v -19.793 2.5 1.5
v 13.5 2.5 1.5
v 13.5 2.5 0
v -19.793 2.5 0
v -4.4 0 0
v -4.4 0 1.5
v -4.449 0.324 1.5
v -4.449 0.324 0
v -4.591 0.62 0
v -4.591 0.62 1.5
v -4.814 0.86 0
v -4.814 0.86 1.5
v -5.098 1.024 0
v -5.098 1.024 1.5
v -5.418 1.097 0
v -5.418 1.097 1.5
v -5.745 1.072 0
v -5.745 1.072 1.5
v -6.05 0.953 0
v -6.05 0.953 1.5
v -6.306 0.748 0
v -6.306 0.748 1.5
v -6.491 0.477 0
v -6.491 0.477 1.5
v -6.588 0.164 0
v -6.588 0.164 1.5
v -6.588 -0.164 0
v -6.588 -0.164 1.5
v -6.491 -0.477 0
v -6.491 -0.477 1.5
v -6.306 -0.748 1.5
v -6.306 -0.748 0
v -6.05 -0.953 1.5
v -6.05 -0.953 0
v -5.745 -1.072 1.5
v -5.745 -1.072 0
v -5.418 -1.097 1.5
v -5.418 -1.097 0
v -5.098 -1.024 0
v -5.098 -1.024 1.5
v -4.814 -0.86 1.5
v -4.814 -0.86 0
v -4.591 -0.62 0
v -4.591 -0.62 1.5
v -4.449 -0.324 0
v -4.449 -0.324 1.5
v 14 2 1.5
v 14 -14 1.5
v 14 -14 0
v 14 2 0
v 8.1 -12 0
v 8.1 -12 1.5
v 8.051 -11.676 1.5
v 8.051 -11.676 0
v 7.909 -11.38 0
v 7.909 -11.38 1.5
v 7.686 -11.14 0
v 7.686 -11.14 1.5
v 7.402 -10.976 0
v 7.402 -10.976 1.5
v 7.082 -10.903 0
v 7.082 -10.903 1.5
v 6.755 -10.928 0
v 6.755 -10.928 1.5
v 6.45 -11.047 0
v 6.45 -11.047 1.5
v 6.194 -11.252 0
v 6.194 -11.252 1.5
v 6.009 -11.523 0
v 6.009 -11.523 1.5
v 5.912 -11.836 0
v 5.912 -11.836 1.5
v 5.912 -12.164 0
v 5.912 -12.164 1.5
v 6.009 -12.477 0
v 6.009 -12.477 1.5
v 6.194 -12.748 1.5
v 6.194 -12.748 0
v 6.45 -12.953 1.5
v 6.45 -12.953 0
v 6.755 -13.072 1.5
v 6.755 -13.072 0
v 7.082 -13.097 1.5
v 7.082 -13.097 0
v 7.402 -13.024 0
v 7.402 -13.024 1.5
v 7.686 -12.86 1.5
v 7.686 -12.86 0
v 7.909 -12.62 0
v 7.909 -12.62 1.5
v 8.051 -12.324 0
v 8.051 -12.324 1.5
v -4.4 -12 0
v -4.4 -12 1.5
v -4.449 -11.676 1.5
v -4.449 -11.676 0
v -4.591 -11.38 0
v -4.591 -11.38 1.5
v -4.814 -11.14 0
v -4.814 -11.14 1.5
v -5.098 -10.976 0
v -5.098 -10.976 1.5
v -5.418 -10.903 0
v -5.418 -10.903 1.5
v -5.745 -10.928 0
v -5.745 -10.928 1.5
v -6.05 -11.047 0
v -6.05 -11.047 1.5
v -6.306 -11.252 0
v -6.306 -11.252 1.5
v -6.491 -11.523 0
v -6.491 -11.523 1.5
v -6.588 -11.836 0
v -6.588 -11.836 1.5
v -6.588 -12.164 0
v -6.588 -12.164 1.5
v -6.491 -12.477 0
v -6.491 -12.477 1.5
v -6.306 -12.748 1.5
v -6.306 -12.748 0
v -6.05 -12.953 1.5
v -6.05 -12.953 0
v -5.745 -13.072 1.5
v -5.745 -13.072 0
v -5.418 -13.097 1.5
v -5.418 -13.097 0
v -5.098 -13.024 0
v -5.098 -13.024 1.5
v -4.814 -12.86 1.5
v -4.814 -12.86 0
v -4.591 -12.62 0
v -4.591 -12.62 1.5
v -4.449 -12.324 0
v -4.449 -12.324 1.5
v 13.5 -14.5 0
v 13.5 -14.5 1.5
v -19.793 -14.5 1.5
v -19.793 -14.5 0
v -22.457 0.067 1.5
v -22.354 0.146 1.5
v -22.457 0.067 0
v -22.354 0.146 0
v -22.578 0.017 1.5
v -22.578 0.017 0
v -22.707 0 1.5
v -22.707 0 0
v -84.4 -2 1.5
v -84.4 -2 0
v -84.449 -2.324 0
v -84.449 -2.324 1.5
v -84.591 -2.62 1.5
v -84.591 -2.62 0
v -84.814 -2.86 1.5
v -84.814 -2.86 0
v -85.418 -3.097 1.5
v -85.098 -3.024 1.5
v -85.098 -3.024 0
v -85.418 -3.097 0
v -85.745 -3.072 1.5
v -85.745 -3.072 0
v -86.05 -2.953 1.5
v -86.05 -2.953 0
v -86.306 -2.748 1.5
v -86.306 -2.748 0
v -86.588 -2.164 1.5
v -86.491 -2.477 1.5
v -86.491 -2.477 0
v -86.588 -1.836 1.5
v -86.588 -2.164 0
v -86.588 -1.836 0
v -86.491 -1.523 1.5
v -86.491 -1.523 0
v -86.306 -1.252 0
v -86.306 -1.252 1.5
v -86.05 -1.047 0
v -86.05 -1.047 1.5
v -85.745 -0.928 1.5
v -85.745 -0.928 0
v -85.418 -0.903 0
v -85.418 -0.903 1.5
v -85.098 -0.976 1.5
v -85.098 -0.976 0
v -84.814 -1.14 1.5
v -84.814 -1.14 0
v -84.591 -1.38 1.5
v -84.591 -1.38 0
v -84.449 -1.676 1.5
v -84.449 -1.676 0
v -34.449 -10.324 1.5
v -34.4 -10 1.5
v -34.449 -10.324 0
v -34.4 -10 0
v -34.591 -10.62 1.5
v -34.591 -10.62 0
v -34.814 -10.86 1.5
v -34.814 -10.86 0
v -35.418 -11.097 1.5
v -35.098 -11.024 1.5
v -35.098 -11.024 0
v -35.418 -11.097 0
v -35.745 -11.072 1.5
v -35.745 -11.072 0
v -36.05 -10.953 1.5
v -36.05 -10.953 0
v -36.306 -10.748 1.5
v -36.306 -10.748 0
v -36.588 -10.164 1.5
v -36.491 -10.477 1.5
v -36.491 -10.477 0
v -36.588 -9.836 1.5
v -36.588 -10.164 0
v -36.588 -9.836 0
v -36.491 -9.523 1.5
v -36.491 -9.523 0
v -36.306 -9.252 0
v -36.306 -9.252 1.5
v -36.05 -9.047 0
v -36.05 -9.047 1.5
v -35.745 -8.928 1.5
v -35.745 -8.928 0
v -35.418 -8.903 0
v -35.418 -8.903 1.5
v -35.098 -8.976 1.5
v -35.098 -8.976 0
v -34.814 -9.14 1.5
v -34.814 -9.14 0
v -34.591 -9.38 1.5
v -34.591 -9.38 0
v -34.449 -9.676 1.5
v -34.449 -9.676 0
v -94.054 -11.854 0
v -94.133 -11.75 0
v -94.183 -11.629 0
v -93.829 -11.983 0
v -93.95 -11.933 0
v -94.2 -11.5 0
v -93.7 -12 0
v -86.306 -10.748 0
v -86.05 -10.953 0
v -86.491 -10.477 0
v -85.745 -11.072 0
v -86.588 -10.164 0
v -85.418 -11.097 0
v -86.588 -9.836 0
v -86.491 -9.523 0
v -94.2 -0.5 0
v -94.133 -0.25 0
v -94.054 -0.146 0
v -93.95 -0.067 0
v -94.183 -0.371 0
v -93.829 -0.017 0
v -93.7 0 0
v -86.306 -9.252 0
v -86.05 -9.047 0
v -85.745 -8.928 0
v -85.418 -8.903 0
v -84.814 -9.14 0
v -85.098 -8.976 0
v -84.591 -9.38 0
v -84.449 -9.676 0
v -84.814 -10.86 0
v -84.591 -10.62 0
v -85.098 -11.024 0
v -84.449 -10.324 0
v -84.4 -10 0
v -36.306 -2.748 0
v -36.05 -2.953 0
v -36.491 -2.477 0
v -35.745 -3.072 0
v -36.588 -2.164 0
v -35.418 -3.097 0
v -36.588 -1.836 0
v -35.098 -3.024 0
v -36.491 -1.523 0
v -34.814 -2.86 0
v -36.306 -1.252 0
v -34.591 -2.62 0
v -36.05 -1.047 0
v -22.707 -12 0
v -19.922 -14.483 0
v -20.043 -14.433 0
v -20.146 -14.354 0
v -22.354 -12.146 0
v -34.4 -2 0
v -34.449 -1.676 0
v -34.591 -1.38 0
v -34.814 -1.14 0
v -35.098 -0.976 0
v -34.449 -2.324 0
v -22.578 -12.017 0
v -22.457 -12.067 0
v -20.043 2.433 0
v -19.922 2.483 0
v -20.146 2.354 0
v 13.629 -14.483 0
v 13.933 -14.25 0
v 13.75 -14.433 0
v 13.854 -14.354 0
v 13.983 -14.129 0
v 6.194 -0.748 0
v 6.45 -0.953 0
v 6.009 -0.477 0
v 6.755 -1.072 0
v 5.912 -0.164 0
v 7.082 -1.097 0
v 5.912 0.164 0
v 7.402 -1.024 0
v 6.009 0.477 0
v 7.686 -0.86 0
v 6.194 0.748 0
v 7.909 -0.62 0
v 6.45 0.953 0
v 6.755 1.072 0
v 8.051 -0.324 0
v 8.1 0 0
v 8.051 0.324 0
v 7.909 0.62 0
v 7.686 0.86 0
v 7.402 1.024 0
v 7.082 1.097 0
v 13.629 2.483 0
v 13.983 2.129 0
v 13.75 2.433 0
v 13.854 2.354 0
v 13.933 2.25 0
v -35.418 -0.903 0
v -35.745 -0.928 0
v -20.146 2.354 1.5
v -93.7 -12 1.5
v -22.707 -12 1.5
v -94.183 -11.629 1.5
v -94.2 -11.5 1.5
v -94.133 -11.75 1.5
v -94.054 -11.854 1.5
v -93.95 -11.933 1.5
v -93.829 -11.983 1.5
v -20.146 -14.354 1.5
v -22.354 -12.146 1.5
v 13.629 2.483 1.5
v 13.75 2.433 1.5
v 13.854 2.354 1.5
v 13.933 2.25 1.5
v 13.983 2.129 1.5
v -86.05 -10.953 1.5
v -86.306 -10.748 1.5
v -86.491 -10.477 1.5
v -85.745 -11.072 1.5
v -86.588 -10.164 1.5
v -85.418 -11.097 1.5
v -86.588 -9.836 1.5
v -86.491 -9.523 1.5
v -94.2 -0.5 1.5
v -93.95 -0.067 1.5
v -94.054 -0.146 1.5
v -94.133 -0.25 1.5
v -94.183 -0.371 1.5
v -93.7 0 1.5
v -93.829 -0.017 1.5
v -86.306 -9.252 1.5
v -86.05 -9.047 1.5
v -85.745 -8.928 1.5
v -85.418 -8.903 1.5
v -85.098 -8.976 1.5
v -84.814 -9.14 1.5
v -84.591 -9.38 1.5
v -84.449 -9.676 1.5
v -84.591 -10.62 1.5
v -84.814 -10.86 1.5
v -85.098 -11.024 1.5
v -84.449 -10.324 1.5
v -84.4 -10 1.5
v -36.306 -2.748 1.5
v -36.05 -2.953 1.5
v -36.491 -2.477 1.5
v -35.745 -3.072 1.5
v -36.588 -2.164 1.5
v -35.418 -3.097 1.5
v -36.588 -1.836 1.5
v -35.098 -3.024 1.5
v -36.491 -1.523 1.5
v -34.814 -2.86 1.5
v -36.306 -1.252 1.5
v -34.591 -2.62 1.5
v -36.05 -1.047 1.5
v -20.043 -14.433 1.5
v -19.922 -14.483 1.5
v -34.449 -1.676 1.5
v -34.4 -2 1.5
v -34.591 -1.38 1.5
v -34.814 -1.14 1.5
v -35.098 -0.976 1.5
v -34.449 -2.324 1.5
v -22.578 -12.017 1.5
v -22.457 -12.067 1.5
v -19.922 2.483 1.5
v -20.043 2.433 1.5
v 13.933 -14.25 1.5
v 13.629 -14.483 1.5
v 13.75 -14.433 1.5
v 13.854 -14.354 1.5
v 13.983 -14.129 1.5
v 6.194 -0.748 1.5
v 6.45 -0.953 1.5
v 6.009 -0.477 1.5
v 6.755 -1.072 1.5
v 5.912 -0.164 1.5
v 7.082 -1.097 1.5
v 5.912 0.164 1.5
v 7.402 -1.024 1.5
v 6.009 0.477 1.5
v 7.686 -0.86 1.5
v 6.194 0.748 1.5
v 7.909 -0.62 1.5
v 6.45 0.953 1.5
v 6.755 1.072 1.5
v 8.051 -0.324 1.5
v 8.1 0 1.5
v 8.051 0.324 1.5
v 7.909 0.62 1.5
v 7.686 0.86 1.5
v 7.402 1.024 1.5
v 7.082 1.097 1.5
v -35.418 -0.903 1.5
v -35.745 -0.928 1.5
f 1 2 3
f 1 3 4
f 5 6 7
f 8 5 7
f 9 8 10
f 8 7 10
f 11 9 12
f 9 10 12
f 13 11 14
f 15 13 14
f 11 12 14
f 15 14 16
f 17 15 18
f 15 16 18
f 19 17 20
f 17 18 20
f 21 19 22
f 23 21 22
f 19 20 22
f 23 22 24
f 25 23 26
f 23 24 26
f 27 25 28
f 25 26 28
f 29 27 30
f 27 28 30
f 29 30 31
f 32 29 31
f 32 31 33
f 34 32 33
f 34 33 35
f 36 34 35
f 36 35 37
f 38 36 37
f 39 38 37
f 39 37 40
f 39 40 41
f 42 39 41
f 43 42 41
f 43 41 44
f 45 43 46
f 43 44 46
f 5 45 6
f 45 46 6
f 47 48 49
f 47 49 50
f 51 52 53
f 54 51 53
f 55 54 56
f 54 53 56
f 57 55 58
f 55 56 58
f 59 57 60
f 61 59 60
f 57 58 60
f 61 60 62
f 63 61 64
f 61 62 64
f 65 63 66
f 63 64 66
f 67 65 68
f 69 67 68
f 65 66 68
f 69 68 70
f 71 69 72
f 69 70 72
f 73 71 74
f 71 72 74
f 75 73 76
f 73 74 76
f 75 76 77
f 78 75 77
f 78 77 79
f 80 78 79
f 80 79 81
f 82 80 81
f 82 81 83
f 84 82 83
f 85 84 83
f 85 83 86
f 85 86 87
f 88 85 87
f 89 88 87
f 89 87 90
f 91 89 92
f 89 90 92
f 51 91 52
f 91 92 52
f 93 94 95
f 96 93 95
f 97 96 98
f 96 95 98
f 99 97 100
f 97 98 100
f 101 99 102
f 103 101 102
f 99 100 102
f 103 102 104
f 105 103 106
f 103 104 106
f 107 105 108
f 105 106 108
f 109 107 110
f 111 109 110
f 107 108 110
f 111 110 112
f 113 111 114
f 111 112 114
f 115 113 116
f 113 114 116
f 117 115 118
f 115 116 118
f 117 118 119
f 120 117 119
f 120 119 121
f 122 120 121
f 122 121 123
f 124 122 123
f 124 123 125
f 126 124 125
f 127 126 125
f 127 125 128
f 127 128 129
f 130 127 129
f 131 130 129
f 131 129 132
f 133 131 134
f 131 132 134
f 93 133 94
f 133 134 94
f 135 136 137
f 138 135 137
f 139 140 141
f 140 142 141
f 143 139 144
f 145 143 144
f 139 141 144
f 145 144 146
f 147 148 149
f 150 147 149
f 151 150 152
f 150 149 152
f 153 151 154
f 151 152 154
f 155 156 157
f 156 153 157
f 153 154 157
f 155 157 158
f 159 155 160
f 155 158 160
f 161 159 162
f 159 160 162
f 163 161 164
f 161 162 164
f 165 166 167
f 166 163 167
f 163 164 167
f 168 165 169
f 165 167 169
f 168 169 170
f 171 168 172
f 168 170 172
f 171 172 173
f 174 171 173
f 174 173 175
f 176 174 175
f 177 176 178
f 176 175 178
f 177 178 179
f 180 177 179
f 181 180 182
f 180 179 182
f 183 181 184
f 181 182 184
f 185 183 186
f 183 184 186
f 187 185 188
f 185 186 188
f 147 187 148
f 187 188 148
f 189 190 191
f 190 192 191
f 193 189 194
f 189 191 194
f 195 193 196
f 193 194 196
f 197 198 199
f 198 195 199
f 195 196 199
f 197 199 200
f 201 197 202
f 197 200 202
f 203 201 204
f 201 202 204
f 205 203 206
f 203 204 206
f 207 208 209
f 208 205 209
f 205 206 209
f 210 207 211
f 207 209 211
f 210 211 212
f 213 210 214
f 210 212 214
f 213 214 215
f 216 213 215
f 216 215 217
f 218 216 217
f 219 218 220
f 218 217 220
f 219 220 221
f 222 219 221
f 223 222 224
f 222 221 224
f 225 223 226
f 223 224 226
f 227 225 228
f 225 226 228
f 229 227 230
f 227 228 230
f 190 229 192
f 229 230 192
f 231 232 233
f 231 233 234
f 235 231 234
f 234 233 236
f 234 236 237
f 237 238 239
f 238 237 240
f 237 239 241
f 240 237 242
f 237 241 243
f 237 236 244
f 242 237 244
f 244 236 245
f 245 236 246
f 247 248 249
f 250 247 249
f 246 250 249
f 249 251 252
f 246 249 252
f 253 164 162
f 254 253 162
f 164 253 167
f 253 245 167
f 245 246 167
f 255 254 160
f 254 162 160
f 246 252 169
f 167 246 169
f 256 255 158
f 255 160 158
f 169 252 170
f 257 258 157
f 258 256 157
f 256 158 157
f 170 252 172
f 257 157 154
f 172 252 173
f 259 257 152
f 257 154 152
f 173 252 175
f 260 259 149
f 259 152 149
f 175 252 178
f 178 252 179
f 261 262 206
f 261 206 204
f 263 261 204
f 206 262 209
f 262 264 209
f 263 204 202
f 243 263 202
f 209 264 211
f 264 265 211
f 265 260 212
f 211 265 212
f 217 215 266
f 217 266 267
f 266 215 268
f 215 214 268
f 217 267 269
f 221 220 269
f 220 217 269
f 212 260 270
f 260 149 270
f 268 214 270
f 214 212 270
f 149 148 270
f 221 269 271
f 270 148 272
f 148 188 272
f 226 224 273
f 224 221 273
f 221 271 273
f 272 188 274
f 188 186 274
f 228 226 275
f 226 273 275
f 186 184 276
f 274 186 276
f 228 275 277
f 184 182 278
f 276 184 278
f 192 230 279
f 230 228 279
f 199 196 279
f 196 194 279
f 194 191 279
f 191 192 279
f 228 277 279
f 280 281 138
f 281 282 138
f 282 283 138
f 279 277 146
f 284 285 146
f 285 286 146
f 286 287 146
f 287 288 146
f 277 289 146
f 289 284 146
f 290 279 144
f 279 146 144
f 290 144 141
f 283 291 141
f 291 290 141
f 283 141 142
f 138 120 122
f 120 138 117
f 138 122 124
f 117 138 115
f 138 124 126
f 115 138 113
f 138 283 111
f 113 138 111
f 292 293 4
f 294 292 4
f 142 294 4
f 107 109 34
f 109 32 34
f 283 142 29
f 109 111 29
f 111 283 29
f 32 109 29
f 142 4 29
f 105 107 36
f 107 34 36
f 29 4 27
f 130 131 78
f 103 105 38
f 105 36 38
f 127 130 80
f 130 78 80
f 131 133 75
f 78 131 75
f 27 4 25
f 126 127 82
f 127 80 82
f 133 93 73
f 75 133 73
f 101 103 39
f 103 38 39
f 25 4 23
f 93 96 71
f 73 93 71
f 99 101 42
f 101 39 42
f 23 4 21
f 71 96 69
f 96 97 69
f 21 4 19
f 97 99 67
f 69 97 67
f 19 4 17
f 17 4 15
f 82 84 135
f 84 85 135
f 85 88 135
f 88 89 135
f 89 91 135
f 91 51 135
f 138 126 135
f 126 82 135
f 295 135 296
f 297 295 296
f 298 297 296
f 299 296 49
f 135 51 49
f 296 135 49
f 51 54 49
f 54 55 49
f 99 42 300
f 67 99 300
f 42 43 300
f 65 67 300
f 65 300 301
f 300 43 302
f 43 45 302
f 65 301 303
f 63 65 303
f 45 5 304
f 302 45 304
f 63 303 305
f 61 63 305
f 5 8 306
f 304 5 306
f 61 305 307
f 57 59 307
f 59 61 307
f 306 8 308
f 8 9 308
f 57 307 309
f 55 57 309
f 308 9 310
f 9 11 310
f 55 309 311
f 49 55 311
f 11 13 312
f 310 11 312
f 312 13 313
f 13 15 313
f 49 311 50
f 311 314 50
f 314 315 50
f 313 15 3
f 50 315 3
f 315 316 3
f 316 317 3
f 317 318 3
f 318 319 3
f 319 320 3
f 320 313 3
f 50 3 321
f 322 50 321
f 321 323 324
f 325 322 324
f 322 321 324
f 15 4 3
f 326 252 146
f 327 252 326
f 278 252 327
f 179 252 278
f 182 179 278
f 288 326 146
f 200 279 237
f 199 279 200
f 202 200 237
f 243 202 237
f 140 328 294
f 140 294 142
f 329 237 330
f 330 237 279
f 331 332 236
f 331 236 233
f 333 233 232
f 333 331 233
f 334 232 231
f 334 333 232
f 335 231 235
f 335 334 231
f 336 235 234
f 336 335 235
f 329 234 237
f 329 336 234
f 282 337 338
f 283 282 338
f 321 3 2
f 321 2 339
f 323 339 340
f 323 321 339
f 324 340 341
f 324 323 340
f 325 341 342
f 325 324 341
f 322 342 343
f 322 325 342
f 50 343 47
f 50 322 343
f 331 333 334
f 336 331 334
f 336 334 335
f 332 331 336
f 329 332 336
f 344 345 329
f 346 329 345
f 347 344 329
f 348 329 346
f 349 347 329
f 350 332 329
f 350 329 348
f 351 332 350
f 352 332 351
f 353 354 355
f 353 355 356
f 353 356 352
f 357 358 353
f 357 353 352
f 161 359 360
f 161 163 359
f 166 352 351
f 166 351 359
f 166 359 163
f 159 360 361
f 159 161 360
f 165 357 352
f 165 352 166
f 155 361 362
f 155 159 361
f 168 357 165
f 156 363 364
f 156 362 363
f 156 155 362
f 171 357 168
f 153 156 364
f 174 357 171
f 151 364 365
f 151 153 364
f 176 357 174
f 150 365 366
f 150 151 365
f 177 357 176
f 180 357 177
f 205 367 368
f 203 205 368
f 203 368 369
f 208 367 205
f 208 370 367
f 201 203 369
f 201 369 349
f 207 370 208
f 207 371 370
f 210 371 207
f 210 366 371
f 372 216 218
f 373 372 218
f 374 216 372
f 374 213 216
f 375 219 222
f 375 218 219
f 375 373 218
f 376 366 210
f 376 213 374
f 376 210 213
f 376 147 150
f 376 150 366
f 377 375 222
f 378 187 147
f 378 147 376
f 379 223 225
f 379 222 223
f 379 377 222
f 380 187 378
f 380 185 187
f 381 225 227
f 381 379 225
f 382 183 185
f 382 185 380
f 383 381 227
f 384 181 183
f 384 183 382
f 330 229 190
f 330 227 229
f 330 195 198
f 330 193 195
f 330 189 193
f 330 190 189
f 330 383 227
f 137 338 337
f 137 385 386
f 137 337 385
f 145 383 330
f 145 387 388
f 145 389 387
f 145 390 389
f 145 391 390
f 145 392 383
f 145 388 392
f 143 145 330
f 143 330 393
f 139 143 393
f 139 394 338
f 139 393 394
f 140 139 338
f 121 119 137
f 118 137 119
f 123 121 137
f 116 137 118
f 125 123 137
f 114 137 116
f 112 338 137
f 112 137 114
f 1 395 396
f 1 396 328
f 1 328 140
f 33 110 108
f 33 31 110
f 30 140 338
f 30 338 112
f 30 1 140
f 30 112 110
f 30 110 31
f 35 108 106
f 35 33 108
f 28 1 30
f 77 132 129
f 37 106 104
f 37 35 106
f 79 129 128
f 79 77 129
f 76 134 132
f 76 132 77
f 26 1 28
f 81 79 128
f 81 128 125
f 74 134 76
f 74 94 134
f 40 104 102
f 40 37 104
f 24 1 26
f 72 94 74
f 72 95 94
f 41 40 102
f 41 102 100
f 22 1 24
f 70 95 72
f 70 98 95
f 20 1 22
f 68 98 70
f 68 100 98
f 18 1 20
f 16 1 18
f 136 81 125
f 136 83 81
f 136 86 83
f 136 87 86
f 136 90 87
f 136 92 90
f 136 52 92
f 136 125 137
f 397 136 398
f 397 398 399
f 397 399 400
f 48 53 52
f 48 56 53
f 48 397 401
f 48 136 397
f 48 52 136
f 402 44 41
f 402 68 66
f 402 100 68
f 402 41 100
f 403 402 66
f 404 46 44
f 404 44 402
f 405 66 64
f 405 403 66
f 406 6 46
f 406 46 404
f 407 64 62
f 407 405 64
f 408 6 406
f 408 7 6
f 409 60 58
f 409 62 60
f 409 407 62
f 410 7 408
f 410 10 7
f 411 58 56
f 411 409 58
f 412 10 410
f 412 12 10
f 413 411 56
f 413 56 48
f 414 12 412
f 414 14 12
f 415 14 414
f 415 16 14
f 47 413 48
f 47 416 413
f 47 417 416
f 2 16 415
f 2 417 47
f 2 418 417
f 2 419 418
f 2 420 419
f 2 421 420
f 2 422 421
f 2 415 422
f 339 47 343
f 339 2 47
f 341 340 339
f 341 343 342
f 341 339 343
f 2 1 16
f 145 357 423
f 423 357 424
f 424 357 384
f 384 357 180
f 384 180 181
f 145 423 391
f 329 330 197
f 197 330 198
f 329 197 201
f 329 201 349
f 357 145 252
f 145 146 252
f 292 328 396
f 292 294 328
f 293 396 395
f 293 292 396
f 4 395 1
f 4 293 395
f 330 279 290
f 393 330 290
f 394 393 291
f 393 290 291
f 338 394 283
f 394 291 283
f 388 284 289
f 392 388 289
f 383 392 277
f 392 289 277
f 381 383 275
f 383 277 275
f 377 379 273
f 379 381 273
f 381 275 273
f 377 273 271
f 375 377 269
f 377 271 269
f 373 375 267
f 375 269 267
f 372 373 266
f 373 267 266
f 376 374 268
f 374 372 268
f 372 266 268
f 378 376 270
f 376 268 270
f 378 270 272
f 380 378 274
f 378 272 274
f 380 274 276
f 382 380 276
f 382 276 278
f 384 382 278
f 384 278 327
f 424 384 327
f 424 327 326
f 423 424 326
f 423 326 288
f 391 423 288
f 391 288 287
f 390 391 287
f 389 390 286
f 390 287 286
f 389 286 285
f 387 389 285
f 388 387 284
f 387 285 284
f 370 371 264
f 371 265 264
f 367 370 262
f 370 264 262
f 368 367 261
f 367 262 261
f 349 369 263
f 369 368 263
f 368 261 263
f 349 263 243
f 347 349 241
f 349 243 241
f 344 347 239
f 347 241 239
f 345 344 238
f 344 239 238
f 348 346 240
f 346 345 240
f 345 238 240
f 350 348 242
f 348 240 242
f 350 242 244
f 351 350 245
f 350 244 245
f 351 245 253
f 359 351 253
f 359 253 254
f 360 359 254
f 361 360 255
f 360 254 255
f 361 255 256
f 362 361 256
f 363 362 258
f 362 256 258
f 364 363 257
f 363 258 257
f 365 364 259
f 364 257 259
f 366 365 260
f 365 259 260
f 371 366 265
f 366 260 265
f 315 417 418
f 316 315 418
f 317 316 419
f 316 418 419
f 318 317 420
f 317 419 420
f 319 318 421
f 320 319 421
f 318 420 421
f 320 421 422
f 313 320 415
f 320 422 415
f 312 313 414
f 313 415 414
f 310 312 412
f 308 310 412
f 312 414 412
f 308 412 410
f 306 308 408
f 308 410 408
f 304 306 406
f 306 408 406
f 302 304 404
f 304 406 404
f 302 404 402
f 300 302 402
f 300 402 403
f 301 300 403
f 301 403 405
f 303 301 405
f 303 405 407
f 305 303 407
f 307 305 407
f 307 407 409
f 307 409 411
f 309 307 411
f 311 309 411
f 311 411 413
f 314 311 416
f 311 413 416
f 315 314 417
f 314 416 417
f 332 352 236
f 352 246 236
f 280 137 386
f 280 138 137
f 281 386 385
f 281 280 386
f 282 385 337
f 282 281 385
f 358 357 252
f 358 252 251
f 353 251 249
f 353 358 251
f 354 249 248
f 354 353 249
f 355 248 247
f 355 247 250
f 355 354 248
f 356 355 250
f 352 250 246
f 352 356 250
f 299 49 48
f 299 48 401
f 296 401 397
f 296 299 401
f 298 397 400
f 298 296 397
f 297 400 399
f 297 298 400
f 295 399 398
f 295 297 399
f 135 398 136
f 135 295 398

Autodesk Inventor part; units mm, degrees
ref_plane "YZ Plane" through (0, 0, 0) normal (1, 0, 0) x (0, 1, 0)
ref_plane "XZ Plane" through (0, 0, 0) normal (0, 1, 0) x (-1, 0, 0)
ref_plane "XY Plane" through (0, 0, 0) normal (0, 0, 1) x (1, 0, 0)
sketch "スケッチ1" plane through (0, 0, 0) normal (0, 0, 1) x (1, 0, 0)
  line L0 (0, 0) -> (-94.2, 0)
  line L1 (-94.2, 0) -> (-94.2, -12)
  line L2 (-94.2, -12) -> (0, -12)
  line L3 (0, -12) -> (0, 0)
  circle A0 centre (-85.5, -2) radius 1.1
  circle A1 centre (-85.5, -10) radius 1.1
  circle A2 centre (-35.5, -10) radius 1.1
  circle A3 centre (-35.5, -2) radius 1.1
  dimension "d0" = 94.2
  dimension "d1" = 12
  dimension "d2" = 2.2
  dimension "d3" = 2.2
  dimension "d4" = 8.7
  dimension "d5" = 2.2
  dimension "d7" = 2.2
  dimension "d9" = 50
  dimension "d10" = 50
extrude "押し出し1" add sketch "スケッチ1" along normal blind 1.5
sketch "スケッチ2" plane through (0, 0, 1.5) normal (0, 0, 1) x (1, 0, 0)
  line L0 (0, 2.5) -> (0, -14.5)
  line L1 (0, -14.5) -> (-20, -14.5)
  line L2 (-20, -14.5) -> (-22.5, -12)
  line L3 (-94.2, -12) -> (0, -12) projected
  line L4 (-22.5, -12) -> (-22.5, 0)
  line L5 (0, 0) -> (-94.2, 0) projected
  line L6 (0, 2.5) -> (-20, 2.5)
  line L7 (-20, 2.5) -> (-22.5, 0)
  dimension "d17" = 17
  dimension "d18" = 20
  dimension "d19" = 135
extrude "押し出し2" add sketch "スケッチ2" against normal blind 1.5
sketch "スケッチ3" plane through (0, 0, 1.5) normal (0, 0, 1) x (1, 0, 0)
  circle A0 centre (-5.5, -12) radius 1.1
  circle A1 centre (-5.5, 0) radius 1.1
  point P0 (0, 0)
  dimension "d22" = 2.2
  dimension "d23" = 2.2
extrude "押し出し3" cut sketch "スケッチ3" against normal blind 1.5
sketch "スケッチ4" plane through (0, 0, 1.5) normal (0, 0, 1) x (1, 0, 0)
  line L0 (0, -14.5) -> (0, 2.5) projected
  line L1 (0, -6) -> (14, -6)
  line L2 (0, -6) -> (14, -6) construction
  line L3 (-20, -14.5) -> (0, -14.5) projected
  line L4 (0, -14.5) -> (14, -14.5)
  line L5 (14, -14.5) -> (14, 2.5)
  line L6 (-20, 2.5) -> (0, 2.5) projected
  line L7 (14, 2.5) -> (0, 2.5)
  line L8 (0, 2.5) -> (0, -14.5)
  circle A0 centre (7, -12) radius 1.1
  circle A1 centre (7, 0) radius 1.1
  point P0 (0, 0)
  dimension "d27" = 14
  dimension "d28" = 0
  dimension "d29" = 2.2
  dimension "d30" = 2.2
extrude "押し出し4" add sketch "スケッチ4" against normal blind 1.5
fillet "フィレット3" radius 0.5 8 edges at (14, 2.5, 0.75) (-20, 2.5, 0.75) (-22.5, 0, 0.75) (-94.2, 0, 0.75) (-94.2, -12, 0.75) (-22.5, -12, 0.75) (-20, -14.5, 0.75) (14, -14.5, 0.75)
properties part number "slider_plate" material "アルミニウム"
